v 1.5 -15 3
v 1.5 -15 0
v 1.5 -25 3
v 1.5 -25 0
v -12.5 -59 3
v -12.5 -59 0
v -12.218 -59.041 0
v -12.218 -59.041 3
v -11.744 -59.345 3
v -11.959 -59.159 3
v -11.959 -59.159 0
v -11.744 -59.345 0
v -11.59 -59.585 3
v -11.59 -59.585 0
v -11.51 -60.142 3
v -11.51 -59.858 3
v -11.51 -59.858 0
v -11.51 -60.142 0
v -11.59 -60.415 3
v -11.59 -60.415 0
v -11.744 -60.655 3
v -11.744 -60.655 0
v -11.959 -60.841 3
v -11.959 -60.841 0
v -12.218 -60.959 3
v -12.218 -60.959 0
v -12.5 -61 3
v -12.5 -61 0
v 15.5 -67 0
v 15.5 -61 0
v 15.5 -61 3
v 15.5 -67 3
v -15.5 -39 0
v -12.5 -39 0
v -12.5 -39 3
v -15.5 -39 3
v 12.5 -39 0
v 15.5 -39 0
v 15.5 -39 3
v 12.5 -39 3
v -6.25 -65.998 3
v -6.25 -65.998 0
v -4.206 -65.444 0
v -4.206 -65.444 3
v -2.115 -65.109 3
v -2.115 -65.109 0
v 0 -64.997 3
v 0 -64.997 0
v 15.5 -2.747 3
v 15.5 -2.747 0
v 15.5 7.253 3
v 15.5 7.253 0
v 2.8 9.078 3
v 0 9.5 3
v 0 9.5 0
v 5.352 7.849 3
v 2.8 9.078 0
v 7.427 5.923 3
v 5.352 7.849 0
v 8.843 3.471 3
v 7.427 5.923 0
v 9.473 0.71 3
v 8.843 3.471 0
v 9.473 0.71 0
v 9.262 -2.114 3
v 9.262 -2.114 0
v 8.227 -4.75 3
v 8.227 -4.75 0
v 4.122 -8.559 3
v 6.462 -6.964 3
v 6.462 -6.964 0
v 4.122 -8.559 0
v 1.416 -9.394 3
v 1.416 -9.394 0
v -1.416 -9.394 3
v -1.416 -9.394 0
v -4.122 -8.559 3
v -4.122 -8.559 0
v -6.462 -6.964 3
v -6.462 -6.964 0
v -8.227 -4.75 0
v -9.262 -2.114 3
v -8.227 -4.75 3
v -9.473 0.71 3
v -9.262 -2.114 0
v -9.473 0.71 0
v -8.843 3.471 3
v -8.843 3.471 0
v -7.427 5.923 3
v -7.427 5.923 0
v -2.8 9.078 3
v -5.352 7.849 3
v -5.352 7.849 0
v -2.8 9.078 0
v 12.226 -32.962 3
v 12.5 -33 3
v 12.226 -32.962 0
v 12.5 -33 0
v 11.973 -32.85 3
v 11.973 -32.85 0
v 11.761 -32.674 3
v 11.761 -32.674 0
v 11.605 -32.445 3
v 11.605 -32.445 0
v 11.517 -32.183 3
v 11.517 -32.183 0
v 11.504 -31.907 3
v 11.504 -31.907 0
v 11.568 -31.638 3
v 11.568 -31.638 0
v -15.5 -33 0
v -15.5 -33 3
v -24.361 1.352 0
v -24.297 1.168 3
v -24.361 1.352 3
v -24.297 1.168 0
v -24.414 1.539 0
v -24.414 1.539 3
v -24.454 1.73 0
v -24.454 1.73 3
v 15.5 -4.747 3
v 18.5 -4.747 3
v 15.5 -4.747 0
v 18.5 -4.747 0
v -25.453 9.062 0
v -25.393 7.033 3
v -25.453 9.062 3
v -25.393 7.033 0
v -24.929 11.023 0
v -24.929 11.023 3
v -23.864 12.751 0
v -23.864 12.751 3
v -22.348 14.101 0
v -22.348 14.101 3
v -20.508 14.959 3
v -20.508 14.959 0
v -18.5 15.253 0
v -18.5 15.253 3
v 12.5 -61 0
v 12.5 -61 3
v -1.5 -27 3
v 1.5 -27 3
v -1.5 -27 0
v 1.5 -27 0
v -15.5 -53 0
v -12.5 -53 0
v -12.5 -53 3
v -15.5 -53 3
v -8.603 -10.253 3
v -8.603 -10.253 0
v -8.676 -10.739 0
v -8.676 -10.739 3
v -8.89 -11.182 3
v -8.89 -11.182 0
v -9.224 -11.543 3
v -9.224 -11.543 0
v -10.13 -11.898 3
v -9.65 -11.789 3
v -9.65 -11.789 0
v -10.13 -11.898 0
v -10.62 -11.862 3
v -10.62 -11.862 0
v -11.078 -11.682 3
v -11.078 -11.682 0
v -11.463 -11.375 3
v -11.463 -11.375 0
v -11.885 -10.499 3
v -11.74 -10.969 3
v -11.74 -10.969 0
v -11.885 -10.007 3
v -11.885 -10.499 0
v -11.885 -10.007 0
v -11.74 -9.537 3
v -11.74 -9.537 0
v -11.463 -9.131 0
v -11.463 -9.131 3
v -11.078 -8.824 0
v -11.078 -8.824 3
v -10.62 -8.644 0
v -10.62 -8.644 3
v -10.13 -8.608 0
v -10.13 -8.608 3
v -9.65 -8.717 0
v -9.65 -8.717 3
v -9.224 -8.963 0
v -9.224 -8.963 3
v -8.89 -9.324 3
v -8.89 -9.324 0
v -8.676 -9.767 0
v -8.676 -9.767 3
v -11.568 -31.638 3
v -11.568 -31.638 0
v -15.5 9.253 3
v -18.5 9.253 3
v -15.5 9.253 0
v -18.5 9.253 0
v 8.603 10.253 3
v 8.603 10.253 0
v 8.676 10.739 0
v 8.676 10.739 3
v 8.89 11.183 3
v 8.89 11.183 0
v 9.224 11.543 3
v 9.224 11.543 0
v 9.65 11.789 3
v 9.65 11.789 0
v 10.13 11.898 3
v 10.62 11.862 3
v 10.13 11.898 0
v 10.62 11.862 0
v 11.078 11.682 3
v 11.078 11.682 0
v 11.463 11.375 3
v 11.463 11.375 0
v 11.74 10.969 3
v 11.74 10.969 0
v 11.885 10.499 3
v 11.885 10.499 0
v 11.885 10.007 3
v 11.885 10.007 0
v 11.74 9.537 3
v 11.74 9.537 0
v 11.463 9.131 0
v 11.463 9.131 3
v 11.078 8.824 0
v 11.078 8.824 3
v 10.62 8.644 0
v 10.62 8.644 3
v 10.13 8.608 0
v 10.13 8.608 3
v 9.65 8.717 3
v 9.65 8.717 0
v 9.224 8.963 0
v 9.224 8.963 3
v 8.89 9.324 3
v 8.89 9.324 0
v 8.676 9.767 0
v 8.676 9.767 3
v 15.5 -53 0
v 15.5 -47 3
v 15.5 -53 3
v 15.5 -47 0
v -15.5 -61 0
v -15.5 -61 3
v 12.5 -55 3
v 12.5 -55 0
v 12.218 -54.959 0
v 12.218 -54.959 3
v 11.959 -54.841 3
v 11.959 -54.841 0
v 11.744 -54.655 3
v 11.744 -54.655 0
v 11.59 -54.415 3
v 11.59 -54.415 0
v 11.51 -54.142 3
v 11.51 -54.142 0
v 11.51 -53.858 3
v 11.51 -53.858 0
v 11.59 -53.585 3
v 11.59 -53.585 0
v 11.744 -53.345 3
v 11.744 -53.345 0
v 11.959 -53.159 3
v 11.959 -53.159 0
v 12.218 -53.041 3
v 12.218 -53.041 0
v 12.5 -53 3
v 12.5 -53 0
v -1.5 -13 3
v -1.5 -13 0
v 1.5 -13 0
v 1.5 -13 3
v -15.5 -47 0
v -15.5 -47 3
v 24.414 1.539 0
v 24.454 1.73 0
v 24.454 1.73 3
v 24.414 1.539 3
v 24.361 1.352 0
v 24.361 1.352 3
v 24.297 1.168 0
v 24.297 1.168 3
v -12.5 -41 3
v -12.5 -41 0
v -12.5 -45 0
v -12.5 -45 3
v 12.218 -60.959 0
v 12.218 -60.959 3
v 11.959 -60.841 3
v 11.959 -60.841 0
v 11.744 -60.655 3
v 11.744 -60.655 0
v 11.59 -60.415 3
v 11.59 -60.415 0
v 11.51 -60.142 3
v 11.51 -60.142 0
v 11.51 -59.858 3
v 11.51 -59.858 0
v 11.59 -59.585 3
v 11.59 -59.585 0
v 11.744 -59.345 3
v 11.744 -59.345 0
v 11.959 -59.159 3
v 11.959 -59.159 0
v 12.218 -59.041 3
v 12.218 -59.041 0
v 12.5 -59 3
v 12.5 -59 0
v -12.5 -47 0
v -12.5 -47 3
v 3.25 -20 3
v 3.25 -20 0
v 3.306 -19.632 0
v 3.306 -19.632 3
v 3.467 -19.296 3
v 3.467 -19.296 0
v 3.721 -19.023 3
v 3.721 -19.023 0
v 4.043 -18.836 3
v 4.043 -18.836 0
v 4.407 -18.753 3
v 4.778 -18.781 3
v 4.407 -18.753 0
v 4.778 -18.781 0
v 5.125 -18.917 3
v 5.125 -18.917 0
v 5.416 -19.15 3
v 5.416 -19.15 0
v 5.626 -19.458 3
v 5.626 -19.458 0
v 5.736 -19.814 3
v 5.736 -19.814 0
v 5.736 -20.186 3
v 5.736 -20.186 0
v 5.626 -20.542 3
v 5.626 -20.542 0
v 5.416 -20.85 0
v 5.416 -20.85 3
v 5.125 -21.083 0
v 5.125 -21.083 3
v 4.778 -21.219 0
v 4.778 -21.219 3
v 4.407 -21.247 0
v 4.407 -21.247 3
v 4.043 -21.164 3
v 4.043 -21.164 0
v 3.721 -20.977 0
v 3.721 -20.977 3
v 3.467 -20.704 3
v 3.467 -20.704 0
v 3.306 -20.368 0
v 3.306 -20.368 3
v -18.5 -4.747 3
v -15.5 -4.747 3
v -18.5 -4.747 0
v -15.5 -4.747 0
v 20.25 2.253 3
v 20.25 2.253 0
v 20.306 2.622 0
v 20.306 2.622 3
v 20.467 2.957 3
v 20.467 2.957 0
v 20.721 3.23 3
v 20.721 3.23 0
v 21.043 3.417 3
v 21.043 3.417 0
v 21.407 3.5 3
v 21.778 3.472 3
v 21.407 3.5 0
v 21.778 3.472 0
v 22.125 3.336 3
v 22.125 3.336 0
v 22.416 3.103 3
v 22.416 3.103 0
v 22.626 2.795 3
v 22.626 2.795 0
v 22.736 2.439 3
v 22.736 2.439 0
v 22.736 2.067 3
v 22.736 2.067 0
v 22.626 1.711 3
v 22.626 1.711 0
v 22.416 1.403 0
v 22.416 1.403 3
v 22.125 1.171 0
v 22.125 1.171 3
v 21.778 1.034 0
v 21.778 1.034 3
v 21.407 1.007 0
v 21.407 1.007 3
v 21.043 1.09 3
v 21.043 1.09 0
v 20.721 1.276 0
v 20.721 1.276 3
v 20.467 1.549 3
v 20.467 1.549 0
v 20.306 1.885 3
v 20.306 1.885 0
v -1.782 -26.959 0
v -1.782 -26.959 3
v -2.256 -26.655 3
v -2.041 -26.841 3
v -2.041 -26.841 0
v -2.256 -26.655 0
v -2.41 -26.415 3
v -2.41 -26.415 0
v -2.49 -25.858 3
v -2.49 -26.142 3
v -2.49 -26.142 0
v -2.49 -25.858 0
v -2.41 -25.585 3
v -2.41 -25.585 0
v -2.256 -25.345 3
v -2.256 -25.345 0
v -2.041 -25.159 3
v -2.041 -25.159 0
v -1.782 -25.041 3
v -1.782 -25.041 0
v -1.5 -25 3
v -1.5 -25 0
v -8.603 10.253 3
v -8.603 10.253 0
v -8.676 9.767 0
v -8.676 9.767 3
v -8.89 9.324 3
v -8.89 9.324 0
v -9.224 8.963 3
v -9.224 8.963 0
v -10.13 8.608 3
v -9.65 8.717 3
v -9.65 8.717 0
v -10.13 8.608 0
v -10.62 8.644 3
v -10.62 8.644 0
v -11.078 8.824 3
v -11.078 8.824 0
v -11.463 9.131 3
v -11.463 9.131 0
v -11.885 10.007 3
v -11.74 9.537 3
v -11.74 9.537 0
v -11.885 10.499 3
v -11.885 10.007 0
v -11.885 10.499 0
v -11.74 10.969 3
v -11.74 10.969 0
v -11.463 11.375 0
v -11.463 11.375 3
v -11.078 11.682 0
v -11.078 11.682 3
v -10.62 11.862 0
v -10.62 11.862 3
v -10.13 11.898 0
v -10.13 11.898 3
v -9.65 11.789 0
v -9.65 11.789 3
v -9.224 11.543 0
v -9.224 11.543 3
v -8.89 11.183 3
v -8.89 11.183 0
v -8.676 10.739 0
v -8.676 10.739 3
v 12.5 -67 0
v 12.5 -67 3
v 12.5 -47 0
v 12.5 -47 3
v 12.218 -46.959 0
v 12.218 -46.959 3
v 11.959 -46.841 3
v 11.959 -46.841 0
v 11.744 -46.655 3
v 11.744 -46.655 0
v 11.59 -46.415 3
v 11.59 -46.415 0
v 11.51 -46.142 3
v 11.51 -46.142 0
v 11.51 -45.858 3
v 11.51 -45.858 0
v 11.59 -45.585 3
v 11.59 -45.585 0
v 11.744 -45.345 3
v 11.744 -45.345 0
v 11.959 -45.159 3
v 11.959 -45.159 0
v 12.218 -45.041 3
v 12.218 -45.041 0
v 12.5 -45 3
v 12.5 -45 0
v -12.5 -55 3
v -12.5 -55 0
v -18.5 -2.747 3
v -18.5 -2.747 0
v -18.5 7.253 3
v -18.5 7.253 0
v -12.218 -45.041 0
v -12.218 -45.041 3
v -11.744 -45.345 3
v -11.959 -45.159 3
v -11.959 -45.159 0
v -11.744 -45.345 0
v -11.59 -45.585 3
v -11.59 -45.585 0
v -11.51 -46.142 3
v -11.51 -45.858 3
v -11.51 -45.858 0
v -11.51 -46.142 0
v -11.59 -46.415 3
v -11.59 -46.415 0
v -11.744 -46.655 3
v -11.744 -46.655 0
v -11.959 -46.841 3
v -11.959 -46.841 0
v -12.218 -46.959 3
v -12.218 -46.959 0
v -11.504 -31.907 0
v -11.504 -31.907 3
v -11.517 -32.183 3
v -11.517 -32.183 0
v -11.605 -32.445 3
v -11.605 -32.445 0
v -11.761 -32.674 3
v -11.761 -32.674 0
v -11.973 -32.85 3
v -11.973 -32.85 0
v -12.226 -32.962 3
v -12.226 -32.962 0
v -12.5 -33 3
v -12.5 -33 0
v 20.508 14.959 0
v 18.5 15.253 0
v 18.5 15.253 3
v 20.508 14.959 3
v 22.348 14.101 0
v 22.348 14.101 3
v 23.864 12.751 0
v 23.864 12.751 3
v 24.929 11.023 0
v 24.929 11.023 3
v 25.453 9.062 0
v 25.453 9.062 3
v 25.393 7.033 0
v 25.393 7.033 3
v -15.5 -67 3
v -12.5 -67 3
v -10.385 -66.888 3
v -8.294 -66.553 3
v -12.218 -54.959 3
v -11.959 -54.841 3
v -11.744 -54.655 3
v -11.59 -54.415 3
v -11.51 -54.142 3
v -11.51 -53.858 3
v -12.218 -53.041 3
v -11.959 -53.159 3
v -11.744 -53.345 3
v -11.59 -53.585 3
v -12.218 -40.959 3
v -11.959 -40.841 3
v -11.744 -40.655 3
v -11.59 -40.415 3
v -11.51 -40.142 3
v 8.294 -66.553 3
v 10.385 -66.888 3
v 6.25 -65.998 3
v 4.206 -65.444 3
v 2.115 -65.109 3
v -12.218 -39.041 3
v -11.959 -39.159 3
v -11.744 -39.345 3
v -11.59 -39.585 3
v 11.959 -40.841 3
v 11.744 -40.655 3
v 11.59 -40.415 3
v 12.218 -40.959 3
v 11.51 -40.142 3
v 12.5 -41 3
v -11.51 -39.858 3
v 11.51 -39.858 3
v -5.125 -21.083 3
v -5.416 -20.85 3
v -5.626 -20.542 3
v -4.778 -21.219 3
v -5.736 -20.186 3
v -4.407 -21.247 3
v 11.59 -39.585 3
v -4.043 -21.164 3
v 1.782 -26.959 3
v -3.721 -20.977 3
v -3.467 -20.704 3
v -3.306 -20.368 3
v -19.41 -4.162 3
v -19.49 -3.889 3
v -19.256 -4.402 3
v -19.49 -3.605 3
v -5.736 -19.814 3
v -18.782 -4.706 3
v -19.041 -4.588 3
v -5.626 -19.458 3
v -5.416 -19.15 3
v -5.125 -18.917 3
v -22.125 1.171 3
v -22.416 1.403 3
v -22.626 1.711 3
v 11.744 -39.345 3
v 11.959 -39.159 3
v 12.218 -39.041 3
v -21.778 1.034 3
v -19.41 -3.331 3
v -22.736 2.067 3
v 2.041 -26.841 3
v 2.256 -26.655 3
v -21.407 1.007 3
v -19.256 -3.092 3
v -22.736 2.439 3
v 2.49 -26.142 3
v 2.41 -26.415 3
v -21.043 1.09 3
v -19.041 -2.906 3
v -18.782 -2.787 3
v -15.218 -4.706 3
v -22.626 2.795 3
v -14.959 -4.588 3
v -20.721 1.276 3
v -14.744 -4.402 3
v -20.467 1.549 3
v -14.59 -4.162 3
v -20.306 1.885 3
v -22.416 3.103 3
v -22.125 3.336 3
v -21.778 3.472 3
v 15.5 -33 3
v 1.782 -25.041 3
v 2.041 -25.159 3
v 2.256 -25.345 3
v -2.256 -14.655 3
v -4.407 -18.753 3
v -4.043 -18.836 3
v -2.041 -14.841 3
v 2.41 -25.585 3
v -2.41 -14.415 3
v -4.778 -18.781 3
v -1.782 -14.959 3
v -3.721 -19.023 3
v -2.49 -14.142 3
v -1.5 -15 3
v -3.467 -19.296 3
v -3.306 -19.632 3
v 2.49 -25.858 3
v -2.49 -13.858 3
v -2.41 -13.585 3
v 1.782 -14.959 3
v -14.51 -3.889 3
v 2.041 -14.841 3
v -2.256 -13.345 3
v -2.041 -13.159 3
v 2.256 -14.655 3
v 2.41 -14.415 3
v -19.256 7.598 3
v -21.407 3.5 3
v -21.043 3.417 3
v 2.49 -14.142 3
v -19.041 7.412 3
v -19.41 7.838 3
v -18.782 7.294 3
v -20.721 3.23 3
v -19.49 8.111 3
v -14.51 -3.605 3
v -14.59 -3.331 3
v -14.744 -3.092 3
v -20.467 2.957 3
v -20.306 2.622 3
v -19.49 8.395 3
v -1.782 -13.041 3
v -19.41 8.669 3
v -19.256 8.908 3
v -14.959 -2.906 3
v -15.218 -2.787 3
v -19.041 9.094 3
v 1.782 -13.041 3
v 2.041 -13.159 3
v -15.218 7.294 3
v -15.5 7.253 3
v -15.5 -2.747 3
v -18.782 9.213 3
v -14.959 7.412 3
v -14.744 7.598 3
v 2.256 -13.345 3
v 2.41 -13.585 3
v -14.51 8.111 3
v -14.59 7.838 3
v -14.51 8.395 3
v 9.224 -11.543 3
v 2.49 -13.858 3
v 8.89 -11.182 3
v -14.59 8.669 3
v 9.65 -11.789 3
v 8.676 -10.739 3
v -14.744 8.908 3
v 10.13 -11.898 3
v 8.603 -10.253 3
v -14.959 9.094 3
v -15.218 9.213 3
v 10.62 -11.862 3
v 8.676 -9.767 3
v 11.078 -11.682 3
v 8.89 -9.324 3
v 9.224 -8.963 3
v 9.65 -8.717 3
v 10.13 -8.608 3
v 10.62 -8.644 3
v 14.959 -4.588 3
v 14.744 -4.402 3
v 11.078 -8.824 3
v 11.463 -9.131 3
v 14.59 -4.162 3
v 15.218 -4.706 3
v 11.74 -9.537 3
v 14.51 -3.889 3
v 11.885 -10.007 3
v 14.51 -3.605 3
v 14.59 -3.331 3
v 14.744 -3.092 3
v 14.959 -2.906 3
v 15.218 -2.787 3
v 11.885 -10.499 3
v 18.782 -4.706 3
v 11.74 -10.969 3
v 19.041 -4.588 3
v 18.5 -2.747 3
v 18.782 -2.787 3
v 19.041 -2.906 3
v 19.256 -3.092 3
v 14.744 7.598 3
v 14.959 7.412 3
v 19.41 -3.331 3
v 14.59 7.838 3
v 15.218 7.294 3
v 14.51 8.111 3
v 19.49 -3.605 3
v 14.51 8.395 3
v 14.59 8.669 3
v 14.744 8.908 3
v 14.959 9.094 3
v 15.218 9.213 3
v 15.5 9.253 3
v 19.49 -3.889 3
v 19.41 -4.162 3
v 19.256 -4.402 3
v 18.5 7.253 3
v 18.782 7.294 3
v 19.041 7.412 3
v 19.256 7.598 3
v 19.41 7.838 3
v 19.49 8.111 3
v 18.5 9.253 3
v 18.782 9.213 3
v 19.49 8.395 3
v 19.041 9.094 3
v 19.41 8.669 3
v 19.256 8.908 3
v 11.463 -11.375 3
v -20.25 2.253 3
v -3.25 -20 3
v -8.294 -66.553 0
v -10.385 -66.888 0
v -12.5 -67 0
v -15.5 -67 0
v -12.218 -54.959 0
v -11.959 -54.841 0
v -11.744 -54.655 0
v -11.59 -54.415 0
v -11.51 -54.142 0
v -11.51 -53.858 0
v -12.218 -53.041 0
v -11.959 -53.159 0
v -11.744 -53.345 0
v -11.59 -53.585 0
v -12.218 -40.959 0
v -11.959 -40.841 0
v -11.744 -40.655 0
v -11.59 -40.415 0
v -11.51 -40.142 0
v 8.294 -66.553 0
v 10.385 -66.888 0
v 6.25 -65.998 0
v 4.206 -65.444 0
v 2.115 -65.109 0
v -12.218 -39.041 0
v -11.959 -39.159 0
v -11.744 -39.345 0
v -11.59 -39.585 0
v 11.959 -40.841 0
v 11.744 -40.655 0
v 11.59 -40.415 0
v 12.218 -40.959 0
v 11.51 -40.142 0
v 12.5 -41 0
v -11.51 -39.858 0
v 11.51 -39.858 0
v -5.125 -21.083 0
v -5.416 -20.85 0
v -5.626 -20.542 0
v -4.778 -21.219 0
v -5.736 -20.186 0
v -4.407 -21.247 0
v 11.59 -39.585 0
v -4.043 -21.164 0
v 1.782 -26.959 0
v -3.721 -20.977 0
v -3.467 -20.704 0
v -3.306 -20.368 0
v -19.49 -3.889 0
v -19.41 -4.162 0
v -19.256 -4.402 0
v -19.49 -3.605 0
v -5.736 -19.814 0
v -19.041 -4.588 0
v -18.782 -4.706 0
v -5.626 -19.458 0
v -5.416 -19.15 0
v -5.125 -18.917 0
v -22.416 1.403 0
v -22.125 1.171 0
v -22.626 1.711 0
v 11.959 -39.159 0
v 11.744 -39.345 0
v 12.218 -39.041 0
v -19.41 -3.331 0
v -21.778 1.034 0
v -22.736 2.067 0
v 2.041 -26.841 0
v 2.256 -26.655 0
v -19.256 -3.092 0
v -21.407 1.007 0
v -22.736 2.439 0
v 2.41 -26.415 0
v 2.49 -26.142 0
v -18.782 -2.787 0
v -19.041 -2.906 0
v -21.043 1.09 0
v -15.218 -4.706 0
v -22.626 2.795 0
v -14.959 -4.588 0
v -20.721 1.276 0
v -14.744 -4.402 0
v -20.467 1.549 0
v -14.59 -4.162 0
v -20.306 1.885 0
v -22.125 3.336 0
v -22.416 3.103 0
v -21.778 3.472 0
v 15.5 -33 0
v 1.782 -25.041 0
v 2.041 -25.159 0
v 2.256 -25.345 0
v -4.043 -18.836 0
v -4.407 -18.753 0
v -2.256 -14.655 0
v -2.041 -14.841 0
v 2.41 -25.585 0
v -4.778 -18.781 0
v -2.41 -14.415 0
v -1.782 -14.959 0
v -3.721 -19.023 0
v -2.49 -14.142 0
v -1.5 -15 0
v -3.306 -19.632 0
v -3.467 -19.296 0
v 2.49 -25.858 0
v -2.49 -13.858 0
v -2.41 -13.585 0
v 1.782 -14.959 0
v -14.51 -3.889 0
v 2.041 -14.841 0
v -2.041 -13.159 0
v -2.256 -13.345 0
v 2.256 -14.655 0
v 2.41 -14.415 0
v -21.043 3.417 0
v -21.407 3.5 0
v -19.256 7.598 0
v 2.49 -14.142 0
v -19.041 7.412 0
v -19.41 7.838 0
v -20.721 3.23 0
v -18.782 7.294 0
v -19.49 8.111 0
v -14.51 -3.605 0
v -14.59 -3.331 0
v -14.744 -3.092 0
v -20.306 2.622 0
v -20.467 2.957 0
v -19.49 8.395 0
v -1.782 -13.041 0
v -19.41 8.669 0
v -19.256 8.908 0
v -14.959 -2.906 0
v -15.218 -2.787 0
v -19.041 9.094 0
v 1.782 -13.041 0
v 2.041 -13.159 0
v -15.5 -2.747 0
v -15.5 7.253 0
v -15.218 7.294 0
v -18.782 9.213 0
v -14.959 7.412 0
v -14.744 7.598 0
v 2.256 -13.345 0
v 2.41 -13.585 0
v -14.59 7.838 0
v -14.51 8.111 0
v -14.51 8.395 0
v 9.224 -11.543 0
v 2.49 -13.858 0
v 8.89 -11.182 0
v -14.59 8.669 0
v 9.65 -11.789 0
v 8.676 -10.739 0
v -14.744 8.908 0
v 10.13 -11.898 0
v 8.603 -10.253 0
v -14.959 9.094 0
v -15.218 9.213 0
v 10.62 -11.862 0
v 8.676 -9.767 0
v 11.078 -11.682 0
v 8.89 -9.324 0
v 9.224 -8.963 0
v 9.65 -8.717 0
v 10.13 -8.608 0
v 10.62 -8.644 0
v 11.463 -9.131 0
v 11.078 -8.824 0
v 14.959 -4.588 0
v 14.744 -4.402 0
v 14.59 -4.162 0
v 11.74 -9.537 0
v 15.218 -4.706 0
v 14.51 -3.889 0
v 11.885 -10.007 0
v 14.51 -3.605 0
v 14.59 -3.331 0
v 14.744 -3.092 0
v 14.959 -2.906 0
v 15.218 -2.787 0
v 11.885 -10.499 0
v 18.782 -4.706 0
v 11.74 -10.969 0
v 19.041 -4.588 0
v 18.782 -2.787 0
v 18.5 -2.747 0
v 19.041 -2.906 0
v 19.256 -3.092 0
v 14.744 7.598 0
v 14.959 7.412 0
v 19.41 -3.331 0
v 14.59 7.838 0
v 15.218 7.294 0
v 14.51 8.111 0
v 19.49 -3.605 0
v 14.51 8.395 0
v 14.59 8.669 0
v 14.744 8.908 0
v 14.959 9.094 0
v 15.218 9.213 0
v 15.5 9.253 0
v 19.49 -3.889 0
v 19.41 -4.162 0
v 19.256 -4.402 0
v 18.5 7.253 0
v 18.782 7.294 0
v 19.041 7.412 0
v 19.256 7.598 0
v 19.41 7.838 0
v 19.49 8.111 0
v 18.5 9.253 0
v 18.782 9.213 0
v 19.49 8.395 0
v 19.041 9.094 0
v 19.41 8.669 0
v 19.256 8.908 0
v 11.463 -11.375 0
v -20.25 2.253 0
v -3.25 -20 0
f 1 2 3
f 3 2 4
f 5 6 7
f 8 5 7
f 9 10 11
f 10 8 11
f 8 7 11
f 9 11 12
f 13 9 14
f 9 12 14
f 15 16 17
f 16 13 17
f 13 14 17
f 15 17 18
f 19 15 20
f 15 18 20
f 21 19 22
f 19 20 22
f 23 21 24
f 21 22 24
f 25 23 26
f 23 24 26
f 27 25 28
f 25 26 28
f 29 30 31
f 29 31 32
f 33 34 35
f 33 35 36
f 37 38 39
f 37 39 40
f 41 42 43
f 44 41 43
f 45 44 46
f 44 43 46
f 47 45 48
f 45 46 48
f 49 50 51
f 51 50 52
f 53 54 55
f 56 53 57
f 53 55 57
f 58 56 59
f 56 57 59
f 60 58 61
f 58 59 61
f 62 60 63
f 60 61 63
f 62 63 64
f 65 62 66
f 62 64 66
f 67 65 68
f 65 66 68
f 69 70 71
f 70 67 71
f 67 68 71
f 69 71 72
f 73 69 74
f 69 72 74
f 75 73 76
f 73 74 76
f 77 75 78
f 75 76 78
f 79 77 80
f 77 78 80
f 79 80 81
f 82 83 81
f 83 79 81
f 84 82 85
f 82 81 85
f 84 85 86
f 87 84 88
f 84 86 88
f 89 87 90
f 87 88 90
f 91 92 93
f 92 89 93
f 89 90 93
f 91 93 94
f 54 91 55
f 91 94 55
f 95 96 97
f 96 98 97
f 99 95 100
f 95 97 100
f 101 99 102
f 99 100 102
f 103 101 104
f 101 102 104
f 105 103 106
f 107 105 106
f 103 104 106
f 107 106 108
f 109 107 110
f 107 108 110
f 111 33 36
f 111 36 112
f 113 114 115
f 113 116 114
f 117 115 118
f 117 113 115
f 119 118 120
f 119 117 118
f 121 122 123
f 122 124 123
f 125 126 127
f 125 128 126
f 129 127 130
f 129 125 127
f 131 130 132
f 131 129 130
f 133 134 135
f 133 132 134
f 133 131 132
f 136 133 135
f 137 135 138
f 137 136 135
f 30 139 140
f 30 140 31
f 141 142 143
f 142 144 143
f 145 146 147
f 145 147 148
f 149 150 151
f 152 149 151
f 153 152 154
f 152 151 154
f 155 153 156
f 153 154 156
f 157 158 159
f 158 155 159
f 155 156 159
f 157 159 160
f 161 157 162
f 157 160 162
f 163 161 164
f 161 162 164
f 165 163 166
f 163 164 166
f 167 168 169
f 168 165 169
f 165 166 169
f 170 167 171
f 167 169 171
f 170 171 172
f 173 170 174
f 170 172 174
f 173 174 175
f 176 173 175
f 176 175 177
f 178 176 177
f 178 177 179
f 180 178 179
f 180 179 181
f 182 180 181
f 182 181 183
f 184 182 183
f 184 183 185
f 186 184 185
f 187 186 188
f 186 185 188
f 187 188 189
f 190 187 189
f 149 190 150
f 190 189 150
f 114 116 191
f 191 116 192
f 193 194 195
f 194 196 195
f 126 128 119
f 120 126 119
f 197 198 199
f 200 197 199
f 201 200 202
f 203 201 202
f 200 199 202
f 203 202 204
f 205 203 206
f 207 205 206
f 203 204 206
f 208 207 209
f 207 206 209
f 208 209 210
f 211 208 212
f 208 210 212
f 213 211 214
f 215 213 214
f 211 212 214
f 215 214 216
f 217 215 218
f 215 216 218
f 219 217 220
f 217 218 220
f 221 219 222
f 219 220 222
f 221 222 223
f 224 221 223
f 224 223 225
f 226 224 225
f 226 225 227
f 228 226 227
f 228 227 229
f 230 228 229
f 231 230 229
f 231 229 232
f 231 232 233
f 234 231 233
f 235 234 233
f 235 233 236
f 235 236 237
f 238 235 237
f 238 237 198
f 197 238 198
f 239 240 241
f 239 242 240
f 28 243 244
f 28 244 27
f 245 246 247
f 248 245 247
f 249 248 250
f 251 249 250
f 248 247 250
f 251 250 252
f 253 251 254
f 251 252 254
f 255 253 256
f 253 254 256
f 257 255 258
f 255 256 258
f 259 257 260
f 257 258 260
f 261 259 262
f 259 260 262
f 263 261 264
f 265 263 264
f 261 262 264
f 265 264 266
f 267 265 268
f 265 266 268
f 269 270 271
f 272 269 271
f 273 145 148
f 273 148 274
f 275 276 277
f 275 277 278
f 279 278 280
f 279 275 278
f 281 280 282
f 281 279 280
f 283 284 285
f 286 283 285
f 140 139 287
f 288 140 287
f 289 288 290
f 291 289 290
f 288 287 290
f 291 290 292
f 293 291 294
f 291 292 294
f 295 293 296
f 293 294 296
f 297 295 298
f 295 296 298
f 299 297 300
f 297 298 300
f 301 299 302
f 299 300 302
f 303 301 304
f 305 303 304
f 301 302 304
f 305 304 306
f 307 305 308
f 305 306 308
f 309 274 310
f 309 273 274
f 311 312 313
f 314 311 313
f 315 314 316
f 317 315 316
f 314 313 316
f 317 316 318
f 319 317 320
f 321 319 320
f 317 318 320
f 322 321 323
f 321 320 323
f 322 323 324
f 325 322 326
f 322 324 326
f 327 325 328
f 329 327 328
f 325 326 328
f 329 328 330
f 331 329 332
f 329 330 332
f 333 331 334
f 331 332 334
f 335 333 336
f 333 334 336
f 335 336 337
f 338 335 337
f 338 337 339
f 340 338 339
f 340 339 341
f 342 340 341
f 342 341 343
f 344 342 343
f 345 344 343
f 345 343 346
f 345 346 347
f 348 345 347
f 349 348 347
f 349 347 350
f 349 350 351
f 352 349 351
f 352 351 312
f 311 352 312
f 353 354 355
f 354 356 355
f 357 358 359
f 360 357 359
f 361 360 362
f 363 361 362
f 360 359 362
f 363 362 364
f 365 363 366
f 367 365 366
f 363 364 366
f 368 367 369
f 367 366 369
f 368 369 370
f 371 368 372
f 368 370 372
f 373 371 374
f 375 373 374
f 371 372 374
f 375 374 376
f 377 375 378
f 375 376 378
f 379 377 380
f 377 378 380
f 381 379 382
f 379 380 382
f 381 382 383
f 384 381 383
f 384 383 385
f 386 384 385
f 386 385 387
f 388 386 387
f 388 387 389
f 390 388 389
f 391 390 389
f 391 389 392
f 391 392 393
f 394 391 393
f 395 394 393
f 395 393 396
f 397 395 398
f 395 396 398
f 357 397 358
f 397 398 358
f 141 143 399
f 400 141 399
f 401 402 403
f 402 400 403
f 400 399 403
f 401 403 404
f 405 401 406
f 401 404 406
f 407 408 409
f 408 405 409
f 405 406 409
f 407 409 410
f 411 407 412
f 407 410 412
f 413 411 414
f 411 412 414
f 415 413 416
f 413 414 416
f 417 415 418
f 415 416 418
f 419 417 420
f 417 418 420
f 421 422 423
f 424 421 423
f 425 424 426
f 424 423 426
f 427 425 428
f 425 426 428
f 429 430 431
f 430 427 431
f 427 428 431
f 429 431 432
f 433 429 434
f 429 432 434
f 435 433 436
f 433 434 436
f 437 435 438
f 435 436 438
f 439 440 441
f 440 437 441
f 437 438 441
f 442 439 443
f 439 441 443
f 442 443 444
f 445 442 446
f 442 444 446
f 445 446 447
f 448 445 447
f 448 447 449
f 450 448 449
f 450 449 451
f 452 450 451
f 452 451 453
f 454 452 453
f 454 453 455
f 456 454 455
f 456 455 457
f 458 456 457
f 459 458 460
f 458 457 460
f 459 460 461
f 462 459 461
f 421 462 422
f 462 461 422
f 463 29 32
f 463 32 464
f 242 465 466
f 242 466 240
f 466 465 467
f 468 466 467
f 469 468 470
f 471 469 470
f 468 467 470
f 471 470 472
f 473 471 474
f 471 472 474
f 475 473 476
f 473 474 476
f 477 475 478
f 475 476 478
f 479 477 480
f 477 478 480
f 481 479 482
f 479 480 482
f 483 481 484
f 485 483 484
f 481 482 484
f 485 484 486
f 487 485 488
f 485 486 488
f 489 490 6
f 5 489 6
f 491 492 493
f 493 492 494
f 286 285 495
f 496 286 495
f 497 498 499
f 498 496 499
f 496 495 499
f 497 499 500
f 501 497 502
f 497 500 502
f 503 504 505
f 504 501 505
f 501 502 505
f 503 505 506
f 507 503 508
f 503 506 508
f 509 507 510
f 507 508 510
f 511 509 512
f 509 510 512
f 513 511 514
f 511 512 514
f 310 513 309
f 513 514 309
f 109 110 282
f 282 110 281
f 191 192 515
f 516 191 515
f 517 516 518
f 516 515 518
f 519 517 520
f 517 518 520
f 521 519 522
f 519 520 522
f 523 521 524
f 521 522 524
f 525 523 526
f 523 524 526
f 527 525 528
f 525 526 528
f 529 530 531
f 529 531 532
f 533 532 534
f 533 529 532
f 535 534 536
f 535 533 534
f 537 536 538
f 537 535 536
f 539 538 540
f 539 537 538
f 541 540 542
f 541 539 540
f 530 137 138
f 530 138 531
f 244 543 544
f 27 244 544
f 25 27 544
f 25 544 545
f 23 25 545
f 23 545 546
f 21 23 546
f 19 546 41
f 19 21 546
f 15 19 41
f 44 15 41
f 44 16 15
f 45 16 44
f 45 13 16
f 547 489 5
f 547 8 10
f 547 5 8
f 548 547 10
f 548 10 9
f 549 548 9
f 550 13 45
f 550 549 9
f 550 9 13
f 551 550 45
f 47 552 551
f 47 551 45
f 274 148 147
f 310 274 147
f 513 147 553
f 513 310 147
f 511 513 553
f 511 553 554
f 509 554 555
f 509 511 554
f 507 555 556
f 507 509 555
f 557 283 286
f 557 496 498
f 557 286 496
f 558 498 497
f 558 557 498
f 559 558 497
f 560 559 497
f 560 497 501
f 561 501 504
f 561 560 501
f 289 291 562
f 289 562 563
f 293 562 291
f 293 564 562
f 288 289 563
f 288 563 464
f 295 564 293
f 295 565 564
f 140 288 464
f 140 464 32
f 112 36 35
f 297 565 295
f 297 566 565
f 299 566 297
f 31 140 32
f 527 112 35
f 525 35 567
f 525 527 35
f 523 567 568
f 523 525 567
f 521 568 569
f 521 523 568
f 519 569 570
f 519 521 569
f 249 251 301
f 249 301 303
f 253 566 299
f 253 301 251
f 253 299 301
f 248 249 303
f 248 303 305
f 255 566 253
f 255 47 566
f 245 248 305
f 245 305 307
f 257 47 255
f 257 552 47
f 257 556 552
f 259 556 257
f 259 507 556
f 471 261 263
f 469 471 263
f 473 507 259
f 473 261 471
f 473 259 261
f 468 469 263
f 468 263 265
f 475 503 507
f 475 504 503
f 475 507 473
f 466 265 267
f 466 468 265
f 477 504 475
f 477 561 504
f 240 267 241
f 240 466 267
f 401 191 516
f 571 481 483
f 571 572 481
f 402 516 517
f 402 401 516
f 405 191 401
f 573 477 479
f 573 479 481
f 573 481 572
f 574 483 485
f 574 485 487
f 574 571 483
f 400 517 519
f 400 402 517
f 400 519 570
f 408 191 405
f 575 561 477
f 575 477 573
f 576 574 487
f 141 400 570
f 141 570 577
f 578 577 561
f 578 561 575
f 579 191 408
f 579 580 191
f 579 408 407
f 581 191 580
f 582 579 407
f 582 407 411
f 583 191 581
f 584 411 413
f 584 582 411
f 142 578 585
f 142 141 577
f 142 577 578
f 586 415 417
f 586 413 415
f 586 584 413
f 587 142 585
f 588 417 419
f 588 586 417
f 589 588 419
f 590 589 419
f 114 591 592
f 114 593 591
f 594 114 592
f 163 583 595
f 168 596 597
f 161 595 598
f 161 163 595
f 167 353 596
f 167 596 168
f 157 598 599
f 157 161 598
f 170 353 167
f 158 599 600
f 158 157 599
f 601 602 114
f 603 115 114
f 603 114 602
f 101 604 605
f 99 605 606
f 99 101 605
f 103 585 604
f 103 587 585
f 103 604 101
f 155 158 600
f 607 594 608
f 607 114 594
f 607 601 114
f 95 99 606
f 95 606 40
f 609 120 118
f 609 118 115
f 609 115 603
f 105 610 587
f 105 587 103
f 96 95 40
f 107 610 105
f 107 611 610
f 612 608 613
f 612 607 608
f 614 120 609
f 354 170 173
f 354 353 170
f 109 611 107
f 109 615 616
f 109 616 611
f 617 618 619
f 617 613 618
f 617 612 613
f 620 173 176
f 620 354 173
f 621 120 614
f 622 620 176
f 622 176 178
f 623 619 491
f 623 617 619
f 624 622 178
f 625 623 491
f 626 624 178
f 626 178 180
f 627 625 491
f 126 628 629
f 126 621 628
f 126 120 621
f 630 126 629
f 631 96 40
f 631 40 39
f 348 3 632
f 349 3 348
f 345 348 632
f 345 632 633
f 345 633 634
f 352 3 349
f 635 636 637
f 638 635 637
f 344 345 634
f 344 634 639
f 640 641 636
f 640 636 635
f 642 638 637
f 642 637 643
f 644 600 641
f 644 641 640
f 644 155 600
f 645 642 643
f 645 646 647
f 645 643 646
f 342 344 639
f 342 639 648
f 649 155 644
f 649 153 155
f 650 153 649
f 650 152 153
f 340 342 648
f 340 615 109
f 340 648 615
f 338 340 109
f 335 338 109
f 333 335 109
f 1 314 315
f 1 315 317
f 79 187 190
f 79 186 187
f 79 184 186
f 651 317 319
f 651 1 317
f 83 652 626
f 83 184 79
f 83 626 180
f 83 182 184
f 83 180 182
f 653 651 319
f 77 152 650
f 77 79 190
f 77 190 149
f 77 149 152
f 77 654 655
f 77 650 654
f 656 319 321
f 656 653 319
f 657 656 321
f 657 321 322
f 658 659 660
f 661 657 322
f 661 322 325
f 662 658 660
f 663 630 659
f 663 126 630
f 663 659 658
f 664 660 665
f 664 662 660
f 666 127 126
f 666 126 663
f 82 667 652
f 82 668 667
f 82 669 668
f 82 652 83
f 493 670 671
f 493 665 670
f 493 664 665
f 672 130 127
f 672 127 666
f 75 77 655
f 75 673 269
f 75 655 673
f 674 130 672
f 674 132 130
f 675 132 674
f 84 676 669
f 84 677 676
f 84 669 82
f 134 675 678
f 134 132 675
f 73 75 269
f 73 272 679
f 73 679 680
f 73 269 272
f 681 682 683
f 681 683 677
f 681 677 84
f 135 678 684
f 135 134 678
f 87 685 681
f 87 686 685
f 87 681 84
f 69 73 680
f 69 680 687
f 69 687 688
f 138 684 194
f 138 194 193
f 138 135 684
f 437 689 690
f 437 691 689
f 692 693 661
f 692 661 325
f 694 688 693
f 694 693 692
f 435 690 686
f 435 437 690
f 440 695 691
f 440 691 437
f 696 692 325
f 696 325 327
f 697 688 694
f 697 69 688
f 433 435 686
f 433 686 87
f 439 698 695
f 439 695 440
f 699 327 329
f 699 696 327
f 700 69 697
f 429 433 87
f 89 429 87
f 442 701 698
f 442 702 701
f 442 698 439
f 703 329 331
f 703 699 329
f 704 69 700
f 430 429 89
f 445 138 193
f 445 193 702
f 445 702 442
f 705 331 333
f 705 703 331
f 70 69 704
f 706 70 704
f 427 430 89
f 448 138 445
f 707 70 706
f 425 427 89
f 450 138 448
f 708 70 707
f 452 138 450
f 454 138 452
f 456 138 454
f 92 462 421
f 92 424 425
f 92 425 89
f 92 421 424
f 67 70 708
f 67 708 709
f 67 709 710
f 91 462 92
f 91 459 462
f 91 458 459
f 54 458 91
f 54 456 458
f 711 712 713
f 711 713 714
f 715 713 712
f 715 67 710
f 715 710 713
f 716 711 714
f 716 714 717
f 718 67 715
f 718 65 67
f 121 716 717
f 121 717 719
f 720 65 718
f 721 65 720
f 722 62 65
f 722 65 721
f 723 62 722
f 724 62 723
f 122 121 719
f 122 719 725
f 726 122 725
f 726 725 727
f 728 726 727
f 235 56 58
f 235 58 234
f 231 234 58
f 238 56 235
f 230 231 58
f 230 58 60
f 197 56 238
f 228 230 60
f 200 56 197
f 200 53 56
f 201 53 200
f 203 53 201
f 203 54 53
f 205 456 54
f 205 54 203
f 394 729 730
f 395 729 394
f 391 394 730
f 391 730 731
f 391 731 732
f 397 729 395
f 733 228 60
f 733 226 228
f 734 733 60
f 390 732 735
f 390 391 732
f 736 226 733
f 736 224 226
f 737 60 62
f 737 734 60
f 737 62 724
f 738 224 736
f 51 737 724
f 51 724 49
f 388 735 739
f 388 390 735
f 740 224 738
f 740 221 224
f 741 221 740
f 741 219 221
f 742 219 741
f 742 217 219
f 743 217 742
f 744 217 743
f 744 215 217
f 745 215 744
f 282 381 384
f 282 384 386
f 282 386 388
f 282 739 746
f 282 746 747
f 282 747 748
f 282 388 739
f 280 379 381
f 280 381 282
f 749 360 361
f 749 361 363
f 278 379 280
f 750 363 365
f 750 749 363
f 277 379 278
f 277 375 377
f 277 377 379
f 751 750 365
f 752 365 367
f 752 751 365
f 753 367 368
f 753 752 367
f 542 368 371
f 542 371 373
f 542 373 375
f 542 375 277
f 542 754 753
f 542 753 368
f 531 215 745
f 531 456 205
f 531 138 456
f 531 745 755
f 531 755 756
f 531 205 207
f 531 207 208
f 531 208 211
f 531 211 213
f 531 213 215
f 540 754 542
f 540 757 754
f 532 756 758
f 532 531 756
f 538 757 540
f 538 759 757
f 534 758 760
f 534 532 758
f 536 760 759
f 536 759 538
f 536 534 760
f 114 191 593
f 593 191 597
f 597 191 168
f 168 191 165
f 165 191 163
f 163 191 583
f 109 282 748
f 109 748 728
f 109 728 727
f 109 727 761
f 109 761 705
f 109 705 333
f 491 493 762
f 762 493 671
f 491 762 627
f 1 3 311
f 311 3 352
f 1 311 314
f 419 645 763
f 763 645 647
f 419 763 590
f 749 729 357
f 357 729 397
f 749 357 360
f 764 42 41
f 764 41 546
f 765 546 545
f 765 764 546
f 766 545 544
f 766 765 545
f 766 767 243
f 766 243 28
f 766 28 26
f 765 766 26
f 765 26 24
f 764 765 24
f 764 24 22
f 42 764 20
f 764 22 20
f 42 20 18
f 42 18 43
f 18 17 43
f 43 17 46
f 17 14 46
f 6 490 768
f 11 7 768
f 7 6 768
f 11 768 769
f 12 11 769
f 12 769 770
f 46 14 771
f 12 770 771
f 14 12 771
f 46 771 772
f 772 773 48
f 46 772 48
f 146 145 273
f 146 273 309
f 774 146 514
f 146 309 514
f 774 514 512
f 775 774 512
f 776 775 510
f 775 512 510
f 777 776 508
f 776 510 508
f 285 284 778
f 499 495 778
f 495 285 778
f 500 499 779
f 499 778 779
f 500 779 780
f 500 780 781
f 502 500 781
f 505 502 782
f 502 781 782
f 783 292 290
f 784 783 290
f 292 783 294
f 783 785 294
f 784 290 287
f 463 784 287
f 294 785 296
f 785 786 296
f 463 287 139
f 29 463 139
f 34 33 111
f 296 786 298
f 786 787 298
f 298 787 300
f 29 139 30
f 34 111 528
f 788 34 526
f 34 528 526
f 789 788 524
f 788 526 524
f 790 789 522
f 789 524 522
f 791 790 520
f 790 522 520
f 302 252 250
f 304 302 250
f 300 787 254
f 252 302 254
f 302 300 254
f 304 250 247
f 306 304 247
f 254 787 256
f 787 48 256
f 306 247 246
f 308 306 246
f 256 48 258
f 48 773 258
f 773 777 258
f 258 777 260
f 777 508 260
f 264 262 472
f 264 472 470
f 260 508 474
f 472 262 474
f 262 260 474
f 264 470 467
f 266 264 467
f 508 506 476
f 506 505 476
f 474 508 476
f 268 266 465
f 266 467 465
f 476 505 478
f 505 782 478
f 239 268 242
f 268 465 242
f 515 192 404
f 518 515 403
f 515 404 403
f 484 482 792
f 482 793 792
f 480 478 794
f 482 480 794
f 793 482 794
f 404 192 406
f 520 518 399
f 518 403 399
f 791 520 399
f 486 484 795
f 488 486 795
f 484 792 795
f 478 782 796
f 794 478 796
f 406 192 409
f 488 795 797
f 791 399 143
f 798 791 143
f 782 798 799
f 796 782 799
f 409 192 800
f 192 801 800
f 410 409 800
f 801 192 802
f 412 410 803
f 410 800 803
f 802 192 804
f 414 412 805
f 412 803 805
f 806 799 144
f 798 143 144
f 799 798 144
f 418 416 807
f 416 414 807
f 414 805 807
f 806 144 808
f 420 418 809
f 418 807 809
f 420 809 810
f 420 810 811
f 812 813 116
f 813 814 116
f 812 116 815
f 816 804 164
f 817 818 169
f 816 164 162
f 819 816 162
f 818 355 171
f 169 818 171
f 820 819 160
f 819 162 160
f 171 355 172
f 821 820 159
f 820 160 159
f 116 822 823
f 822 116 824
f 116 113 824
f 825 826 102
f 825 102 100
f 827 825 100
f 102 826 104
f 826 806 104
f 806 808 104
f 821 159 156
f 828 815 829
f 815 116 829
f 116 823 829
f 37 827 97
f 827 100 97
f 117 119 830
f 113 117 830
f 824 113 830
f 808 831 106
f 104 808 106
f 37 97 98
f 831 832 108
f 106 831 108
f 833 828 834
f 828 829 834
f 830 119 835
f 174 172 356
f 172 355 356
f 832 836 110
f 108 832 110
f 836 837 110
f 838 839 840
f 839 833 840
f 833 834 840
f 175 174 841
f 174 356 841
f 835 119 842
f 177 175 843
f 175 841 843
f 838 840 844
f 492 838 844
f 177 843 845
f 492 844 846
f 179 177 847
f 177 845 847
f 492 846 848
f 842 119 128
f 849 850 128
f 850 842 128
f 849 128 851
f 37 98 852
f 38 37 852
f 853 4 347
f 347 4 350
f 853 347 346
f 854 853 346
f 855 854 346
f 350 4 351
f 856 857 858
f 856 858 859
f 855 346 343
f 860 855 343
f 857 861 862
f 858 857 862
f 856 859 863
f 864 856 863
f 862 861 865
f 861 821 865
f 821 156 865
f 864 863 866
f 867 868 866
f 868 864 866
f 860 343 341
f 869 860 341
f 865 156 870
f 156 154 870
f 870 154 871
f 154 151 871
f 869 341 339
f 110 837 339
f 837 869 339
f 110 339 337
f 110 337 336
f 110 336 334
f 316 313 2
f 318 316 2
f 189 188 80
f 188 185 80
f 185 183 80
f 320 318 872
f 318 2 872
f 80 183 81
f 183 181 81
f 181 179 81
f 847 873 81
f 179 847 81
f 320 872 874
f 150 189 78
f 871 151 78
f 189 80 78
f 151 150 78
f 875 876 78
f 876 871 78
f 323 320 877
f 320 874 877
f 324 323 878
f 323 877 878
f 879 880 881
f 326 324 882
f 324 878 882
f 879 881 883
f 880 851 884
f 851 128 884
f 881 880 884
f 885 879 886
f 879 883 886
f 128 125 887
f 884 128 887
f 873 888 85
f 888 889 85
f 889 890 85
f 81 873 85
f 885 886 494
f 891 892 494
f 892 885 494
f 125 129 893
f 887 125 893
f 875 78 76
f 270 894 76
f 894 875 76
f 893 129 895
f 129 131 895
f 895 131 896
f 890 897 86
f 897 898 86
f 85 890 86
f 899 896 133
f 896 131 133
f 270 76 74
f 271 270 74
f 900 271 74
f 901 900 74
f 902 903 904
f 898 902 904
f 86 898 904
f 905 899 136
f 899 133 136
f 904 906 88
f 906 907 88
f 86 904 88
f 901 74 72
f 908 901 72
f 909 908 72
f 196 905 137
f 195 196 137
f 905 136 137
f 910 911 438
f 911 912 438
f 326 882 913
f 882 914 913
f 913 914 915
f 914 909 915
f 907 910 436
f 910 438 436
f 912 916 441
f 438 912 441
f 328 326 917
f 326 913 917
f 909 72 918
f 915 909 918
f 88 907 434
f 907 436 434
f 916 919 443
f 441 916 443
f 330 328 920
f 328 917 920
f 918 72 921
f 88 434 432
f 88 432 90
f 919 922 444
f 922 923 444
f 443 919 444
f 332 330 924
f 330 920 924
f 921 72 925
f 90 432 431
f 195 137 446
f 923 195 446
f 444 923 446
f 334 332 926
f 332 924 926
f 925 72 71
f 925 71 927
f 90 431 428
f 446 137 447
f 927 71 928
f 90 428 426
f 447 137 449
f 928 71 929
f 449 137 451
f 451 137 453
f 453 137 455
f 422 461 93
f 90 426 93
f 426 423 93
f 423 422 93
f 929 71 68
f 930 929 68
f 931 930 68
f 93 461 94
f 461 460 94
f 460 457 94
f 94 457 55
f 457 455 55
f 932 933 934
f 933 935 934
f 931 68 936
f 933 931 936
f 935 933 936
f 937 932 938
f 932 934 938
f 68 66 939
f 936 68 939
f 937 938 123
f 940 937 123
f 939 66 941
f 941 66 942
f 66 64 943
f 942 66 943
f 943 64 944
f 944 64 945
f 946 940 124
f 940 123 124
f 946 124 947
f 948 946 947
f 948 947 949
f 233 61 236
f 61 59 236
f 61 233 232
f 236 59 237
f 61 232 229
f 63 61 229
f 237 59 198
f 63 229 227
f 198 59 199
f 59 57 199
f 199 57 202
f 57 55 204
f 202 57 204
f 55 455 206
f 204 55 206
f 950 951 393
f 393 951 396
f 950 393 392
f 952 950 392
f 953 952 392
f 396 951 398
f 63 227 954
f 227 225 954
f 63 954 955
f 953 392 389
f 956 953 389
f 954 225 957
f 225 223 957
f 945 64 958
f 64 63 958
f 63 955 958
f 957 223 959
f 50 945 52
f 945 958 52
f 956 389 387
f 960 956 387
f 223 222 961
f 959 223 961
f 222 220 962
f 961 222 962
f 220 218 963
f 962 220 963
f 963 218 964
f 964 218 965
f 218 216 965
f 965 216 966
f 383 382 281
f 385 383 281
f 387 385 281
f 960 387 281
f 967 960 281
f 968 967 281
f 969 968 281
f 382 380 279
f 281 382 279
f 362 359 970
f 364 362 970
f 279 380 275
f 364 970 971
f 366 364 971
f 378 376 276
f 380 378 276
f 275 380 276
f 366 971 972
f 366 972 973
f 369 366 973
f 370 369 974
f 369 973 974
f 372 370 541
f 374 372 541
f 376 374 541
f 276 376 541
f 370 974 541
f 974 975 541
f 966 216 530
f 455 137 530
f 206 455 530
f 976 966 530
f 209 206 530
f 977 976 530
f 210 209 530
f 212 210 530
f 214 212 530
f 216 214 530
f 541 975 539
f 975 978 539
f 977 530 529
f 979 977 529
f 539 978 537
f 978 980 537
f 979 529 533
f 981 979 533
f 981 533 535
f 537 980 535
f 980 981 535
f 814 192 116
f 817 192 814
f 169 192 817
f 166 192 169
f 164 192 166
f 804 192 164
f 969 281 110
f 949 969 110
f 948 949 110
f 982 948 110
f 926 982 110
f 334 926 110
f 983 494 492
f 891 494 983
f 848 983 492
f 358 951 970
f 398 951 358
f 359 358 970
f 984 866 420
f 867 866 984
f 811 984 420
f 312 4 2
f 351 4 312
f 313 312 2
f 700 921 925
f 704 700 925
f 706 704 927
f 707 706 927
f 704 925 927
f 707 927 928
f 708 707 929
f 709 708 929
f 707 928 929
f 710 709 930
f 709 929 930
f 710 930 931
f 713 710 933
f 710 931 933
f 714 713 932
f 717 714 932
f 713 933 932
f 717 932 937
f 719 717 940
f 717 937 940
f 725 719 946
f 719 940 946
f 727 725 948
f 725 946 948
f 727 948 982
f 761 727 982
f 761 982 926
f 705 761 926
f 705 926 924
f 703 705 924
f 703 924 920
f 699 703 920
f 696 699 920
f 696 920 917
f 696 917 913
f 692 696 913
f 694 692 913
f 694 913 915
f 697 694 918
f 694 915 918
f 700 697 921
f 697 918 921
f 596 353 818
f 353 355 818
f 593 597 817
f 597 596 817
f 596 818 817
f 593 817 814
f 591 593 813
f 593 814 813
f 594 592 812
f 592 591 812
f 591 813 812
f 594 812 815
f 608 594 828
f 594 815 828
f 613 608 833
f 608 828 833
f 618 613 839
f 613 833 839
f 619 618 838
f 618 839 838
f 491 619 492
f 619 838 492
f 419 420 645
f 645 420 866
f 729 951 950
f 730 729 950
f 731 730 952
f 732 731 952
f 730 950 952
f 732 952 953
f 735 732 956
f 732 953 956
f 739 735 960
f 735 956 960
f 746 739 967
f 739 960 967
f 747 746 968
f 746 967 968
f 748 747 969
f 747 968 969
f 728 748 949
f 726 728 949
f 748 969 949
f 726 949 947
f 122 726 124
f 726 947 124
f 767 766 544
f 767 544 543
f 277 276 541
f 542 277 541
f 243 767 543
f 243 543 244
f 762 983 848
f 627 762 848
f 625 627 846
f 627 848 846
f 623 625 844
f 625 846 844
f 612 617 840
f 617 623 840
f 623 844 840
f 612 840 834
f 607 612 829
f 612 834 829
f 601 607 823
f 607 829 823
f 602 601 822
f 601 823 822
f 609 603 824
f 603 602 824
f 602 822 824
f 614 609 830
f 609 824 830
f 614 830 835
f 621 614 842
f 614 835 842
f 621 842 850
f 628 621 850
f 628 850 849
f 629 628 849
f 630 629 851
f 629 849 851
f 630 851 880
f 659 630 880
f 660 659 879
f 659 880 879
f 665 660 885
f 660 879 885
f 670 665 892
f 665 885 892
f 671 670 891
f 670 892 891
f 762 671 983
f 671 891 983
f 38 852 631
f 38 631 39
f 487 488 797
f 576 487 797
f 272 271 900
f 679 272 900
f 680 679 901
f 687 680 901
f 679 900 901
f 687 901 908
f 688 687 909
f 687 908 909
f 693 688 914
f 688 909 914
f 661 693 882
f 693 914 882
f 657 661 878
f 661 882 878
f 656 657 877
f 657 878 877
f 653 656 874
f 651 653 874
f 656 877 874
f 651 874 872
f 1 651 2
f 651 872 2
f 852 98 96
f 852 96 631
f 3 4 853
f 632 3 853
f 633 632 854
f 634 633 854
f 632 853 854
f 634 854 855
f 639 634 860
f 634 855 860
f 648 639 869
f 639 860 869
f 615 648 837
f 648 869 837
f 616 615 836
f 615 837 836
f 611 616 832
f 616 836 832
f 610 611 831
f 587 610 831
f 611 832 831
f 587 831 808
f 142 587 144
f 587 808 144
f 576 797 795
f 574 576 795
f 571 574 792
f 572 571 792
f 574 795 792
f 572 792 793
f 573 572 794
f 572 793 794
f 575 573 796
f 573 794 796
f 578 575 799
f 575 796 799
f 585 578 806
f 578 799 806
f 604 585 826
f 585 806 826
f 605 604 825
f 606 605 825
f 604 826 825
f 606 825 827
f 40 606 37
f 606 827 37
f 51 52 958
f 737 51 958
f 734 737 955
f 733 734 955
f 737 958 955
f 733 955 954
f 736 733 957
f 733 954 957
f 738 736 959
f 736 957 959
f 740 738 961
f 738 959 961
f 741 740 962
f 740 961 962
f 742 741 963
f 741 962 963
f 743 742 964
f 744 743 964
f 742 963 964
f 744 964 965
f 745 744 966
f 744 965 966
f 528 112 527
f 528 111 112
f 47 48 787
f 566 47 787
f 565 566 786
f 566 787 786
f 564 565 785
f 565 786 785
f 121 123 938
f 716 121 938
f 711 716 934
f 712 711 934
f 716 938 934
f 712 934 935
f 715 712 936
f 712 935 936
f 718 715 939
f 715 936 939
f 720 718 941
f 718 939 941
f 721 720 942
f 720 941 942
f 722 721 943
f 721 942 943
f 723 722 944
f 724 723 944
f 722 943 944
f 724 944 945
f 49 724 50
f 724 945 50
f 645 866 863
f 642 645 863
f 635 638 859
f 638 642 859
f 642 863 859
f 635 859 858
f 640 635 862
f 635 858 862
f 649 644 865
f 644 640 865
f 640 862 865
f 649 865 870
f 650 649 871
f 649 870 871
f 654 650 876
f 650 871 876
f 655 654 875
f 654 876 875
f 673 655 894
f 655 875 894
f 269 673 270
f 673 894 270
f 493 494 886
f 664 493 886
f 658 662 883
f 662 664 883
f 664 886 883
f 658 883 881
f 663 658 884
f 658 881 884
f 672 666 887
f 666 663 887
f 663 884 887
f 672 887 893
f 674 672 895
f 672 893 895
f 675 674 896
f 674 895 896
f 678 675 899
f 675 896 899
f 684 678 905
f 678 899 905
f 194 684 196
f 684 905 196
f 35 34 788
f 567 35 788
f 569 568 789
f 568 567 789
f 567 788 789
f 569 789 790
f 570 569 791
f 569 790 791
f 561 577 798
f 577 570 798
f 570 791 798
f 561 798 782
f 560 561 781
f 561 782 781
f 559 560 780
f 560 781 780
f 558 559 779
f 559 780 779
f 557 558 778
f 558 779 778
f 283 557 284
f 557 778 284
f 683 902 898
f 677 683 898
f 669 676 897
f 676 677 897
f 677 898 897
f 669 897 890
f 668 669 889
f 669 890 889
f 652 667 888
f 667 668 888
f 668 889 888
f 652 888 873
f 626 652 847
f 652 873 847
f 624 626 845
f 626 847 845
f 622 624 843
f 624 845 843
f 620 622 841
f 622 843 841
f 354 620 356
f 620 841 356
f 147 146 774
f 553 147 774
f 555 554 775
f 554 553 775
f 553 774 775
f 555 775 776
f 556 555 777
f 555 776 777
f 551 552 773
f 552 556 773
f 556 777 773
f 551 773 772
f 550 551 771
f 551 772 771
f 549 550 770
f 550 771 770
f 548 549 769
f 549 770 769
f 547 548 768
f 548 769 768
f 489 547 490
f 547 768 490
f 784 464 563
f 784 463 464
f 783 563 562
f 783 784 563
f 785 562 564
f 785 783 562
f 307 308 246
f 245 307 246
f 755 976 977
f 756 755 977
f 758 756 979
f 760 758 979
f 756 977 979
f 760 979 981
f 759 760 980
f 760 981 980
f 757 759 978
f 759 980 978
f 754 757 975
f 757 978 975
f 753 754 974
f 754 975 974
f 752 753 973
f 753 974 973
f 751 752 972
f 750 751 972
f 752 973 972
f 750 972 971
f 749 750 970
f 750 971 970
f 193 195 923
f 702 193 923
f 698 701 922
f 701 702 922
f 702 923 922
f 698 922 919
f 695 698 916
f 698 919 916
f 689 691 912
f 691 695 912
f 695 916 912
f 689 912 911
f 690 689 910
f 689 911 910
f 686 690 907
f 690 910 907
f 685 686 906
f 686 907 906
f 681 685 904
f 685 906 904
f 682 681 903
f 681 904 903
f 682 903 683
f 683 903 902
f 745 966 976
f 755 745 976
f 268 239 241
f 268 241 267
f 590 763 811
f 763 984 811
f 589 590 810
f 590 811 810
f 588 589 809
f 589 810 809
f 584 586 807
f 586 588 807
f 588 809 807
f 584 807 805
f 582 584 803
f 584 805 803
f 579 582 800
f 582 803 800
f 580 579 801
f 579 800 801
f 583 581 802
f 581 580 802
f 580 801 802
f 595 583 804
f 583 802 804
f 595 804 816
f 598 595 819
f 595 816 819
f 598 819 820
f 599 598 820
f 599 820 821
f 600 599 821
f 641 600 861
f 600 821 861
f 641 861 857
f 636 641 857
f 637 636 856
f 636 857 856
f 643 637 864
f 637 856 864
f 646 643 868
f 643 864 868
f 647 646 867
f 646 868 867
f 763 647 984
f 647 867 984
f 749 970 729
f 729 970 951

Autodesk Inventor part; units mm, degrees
ref_plane "YZ Plane" through (0, 0, 0) normal (1, 0, 0) x (0, 1, 0)
ref_plane "XZ Plane" through (0, 0, 0) normal (0, 1, 0) x (-1, 0, 0)
ref_plane "XY Plane" through (0, 0, 0) normal (0, 0, 1) x (1, 0, 0)
sketch "スケッチ1" plane through (0, -85.3303, 0) normal (0, 0, 1) x (1, 0, 0)
  circle A0 centre (0, 85.3303) radius 5 construction
  line L0 (10.253, 75.0773) -> (-10.253, 75.0773) construction
  line L1 (-10.253, 75.0773) -> (-10.253, 95.5834) construction
  line L2 (-10.253, 95.5834) -> (10.253, 95.5834) construction
  line L3 (10.253, 95.5834) -> (10.253, 75.0773) construction
  line L4 (10.253, 75.0773) -> (-10.253, 95.5834) construction
  line L5 (-10.253, 75.0773) -> (10.253, 95.5834) construction
  circle A1 centre (-10.253, 95.5834) radius 1.65
  circle A2 centre (-10.253, 75.0773) radius 1.65
  circle A3 centre (10.253, 75.0773) radius 1.65
  circle A4 centre (10.253, 95.5834) radius 1.65
  circle A5 centre (0, 85.3303) radius 9.5
  line L6 (-15.5, 52.3303) -> (-12.5, 52.3303)
  line L7 (-12.5, 46.3303) -> (-15.5, 46.3303)
  line L8 (-15.5, 46.3303) -> (-15.5, 52.3303)
  line L9 (-15.5, 38.3303) -> (-12.5, 38.3303)
  line L10 (-12.5, 32.3303) -> (-15.5, 32.3303)
  line L11 (-15.5, 32.3303) -> (-15.5, 38.3303)
  line L12 (-15.5, 24.3303) -> (-12.5, 24.3303)
  line L13 (-12.5, 18.3303) -> (-15.5, 18.3303)
  line L14 (-15.5, 18.3303) -> (-15.5, 24.3303)
  arc A6 (-12.5, 24.3303) -> (-12.5, 26.3303) centre (-12.5, 25.3303) ccw
  arc A7 (-12.5, 30.3303) -> (-12.5, 32.3303) centre (-12.5, 31.3303) ccw
  arc A8 (-12.5, 38.3303) -> (-12.5, 40.3303) centre (-12.5, 39.3303) ccw
  arc A9 (-12.5, 44.3303) -> (-12.5, 46.3303) centre (-12.5, 45.3303) ccw
  line L15 (-12.5, 44.3303) -> (-12.5, 40.3303)
  line L16 (-12.5, 30.3303) -> (-12.5, 26.3303)
  arc A10 (-12.5, 52.3303) -> (-11.5677, 53.692) centre (-12.5, 53.3303) ccw
  line L17 (-18.5, 100.5834) -> (0, 100.5834)
  line L18 (0, 100.5834) -> (0, 94.8303)
  line L19 (5, 15.3303) -> (-5, 15.3303) projected
  line L20 (-5, 15.3303) -> (-5, 18.6303) projected
  line L21 (5, 18.6303) -> (-5, 18.6303) projected
  line L22 (5, 15.3303) -> (5, 18.6303) projected
  arc A11 (0, 20.3336) -> (-6.25, 19.3319) centre (0, 0.3336) ccw
  line L23 (0, 20.3336) -> (0, 75.8303)
  arc A12 (-12.5, 18.3303) -> (-6.25, 19.3319) centre (-12.5, 38.3303) ccw
  line L24 (-18.5, 94.5834) -> (-15.5, 94.5834)
  line L25 (-15.5, 92.5834) -> (-15.5, 82.5834)
  line L26 (-15.5, 80.5834) -> (-18.5, 80.5834)
  line L27 (-18.5, 82.5834) -> (-18.5, 92.5834)
  arc A13 (-18.5, 94.5834) -> (-18.5, 92.5834) centre (-18.5, 93.5834) ccw
  arc A14 (-18.5, 82.5834) -> (-18.5, 80.5834) centre (-18.5, 81.5834) ccw
  arc A15 (-15.5, 80.5834) -> (-15.5, 82.5834) centre (-15.5, 81.5834) ccw
  arc A16 (-15.5, 92.5834) -> (-15.5, 94.5834) centre (-15.5, 93.5834) ccw
  circle A17 centre (-21.5, 87.5834) radius 1.25
  arc A18 (-24.4541, 87.0604) -> (-24.2968, 86.4981) centre (-21.5, 87.5834) ccw
  line L28 (-25.3928, 92.3631) -> (-24.4541, 87.0604)
  line L29 (-24.2968, 86.4981) -> (-11.5677, 53.692)
  arc A19 (-18.5, 100.5834) -> (-25.3928, 92.3631) centre (-18.5, 93.5834) ccw
  line L30 (0, 58.3303) -> (-1.5, 58.3303)
  line L31 (-1.5, 60.3303) -> (-1.5, 70.3303)
  line L32 (-1.5, 72.3303) -> (0, 72.3303)
  arc A20 (-1.5, 72.3303) -> (-1.5, 70.3303) centre (-1.5, 71.3303) ccw
  arc A21 (-1.5, 60.3303) -> (-1.5, 58.3303) centre (-1.5, 59.3303) ccw
  circle A22 centre (-4.5, 65.3303) radius 1.25
  point P0 (0, 85.3303)
  point P1 (-15.5, 87.5834)
  point P2 (-1.5, 65.3303)
  dimension "d0" = 29
  dimension "d1" = 3.3
  dimension "d4" = 360
  dimension "d6" = 19
  dimension "d7" = 15.5
  dimension "d8" = 33
  dimension "d9" = 8
  dimension "d10" = 6
  dimension "d11" = 8
  dimension "d12" = 3
  dimension "d13" = 1
  dimension "d16" = 6
  dimension "d17" = 20
  dimension "d19" = 20
  dimension "d24" = 15.5
  dimension "d26" = 3
  dimension "d27" = 2
  dimension "d28" = 14
  dimension "d31" = 18.5
  dimension "d32" = 5
  dimension "d33" = 2.5
  dimension "d34" = 3
  dimension "d35" = 6
  dimension "d36" = 6
  dimension "d37" = 14
  dimension "d38" = 1.5
  dimension "d39" = 2.5
  dimension "d40" = 3
  dimension "d41" = 20
extrude "押し出し2" add sketch "スケッチ1" along normal blind 3 contours A5 L23 L32 A20 L31 A21 L30 A11 A12 L13 L14 L12 A6 L16 A7 L10 L11 L9 A8 L15 A9 L7 L8 L6 A10 L29 A18 L28 A19 L17 L18
mirror "ミラー2" about plane through (0, -13, 0) normal (1, 0, 0) of "押し出し2"
equation "\"d11\" = d9"
equation "\"d37\" = d28"
properties part number "スライダベアリングハウジング"
